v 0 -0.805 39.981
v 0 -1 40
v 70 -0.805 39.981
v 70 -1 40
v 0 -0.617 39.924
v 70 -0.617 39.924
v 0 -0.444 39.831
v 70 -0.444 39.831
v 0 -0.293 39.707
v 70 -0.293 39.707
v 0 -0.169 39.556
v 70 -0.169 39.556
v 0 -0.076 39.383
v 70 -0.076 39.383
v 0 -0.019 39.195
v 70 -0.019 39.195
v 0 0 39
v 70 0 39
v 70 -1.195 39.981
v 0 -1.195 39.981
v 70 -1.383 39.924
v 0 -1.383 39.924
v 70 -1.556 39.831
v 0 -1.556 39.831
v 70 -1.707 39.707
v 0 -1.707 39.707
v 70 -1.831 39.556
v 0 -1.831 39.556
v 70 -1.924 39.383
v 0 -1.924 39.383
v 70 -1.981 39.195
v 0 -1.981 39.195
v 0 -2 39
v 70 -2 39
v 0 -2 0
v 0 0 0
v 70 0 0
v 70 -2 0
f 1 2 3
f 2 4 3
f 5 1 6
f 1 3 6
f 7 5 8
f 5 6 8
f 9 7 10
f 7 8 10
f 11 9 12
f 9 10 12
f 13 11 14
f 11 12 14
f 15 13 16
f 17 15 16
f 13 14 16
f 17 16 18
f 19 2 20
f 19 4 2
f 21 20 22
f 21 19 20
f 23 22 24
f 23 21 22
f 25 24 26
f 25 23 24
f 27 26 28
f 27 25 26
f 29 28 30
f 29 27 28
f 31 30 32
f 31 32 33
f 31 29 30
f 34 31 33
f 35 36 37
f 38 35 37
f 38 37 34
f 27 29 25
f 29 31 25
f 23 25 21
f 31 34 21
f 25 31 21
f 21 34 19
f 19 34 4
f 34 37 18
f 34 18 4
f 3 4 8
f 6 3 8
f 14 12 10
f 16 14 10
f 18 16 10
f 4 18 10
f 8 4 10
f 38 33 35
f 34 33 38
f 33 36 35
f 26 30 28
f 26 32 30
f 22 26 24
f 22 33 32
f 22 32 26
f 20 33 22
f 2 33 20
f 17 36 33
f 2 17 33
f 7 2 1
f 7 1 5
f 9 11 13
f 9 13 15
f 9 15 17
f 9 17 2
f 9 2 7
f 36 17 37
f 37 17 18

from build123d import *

# Parameters (mm, degrees)
F0_W     = 92.5
F0_H     = 20
F1_DEPTH = 1.4
F2_W     = 2
F2_H     = 2
F3_DEPTH = 25
F4_R     = 0.8
F6_W     = 70
F6_H     = 40
F7_DEPTH = 2
F8_R     = 0.99999


# Not quite as in the source:
# - a fillet or chamfer is up to 0.001 mm smaller than in the source, because OpenCascade refuses the exact size


with BuildPart() as f1:
    # F0 (on Top) → F1 (new body)
    with BuildSketch(Plane.XY):
        with Locations((46.25, 10)):
            Rectangle(F0_W, F0_H)
    extrude(amount=F1_DEPTH)

    # F2 (on face) → F3 (cut)
    with BuildSketch(Plane.XY.offset(1.4)):
        with Locations((1, 3.4)):
            Rectangle(F2_W, F2_H)
        with Locations((1, 7.8)):
            Rectangle(F2_W, F2_H)
        with Locations((1, 12.2)):
            Rectangle(F2_W, F2_H)
        with Locations((1, 16.6)):
            Rectangle(F2_W, F2_H)
    extrude(amount=-F3_DEPTH, mode=Mode.SUBTRACT)

    # F4
    f4_edges = [f1.edges().sort_by_distance(p)[0] for p in [
        (2, 15.6, 0.7),
        (2, 17.6, 0.7),
        (2, 13.2, 0.7),
        (2, 11.2, 0.7),
        (2, 6.8, 0.7),
        (2, 8.8, 0.7),
        (2, 4.4, 0.7),
        (2, 2.4, 0.7),
    ]]
    fillet(f4_edges, radius=F4_R)


with BuildPart() as f7:
    # F6 (on Front) → F7 (new body)
    with BuildSketch(Plane.XZ):
        with Locations((35, 20)):
            Rectangle(F6_W, F6_H)
    extrude(amount=F7_DEPTH)

    # F8 (radius 1 in the source; OpenCascade refuses exactly that, so slightly less here)
    f8_edges = [f7.edges().sort_by_distance(p)[0] for p in [
        (35, -2, 40),
        (35, 0, 40),
    ]]
    fillet(f8_edges, radius=F8_R)


solid = f7.part
